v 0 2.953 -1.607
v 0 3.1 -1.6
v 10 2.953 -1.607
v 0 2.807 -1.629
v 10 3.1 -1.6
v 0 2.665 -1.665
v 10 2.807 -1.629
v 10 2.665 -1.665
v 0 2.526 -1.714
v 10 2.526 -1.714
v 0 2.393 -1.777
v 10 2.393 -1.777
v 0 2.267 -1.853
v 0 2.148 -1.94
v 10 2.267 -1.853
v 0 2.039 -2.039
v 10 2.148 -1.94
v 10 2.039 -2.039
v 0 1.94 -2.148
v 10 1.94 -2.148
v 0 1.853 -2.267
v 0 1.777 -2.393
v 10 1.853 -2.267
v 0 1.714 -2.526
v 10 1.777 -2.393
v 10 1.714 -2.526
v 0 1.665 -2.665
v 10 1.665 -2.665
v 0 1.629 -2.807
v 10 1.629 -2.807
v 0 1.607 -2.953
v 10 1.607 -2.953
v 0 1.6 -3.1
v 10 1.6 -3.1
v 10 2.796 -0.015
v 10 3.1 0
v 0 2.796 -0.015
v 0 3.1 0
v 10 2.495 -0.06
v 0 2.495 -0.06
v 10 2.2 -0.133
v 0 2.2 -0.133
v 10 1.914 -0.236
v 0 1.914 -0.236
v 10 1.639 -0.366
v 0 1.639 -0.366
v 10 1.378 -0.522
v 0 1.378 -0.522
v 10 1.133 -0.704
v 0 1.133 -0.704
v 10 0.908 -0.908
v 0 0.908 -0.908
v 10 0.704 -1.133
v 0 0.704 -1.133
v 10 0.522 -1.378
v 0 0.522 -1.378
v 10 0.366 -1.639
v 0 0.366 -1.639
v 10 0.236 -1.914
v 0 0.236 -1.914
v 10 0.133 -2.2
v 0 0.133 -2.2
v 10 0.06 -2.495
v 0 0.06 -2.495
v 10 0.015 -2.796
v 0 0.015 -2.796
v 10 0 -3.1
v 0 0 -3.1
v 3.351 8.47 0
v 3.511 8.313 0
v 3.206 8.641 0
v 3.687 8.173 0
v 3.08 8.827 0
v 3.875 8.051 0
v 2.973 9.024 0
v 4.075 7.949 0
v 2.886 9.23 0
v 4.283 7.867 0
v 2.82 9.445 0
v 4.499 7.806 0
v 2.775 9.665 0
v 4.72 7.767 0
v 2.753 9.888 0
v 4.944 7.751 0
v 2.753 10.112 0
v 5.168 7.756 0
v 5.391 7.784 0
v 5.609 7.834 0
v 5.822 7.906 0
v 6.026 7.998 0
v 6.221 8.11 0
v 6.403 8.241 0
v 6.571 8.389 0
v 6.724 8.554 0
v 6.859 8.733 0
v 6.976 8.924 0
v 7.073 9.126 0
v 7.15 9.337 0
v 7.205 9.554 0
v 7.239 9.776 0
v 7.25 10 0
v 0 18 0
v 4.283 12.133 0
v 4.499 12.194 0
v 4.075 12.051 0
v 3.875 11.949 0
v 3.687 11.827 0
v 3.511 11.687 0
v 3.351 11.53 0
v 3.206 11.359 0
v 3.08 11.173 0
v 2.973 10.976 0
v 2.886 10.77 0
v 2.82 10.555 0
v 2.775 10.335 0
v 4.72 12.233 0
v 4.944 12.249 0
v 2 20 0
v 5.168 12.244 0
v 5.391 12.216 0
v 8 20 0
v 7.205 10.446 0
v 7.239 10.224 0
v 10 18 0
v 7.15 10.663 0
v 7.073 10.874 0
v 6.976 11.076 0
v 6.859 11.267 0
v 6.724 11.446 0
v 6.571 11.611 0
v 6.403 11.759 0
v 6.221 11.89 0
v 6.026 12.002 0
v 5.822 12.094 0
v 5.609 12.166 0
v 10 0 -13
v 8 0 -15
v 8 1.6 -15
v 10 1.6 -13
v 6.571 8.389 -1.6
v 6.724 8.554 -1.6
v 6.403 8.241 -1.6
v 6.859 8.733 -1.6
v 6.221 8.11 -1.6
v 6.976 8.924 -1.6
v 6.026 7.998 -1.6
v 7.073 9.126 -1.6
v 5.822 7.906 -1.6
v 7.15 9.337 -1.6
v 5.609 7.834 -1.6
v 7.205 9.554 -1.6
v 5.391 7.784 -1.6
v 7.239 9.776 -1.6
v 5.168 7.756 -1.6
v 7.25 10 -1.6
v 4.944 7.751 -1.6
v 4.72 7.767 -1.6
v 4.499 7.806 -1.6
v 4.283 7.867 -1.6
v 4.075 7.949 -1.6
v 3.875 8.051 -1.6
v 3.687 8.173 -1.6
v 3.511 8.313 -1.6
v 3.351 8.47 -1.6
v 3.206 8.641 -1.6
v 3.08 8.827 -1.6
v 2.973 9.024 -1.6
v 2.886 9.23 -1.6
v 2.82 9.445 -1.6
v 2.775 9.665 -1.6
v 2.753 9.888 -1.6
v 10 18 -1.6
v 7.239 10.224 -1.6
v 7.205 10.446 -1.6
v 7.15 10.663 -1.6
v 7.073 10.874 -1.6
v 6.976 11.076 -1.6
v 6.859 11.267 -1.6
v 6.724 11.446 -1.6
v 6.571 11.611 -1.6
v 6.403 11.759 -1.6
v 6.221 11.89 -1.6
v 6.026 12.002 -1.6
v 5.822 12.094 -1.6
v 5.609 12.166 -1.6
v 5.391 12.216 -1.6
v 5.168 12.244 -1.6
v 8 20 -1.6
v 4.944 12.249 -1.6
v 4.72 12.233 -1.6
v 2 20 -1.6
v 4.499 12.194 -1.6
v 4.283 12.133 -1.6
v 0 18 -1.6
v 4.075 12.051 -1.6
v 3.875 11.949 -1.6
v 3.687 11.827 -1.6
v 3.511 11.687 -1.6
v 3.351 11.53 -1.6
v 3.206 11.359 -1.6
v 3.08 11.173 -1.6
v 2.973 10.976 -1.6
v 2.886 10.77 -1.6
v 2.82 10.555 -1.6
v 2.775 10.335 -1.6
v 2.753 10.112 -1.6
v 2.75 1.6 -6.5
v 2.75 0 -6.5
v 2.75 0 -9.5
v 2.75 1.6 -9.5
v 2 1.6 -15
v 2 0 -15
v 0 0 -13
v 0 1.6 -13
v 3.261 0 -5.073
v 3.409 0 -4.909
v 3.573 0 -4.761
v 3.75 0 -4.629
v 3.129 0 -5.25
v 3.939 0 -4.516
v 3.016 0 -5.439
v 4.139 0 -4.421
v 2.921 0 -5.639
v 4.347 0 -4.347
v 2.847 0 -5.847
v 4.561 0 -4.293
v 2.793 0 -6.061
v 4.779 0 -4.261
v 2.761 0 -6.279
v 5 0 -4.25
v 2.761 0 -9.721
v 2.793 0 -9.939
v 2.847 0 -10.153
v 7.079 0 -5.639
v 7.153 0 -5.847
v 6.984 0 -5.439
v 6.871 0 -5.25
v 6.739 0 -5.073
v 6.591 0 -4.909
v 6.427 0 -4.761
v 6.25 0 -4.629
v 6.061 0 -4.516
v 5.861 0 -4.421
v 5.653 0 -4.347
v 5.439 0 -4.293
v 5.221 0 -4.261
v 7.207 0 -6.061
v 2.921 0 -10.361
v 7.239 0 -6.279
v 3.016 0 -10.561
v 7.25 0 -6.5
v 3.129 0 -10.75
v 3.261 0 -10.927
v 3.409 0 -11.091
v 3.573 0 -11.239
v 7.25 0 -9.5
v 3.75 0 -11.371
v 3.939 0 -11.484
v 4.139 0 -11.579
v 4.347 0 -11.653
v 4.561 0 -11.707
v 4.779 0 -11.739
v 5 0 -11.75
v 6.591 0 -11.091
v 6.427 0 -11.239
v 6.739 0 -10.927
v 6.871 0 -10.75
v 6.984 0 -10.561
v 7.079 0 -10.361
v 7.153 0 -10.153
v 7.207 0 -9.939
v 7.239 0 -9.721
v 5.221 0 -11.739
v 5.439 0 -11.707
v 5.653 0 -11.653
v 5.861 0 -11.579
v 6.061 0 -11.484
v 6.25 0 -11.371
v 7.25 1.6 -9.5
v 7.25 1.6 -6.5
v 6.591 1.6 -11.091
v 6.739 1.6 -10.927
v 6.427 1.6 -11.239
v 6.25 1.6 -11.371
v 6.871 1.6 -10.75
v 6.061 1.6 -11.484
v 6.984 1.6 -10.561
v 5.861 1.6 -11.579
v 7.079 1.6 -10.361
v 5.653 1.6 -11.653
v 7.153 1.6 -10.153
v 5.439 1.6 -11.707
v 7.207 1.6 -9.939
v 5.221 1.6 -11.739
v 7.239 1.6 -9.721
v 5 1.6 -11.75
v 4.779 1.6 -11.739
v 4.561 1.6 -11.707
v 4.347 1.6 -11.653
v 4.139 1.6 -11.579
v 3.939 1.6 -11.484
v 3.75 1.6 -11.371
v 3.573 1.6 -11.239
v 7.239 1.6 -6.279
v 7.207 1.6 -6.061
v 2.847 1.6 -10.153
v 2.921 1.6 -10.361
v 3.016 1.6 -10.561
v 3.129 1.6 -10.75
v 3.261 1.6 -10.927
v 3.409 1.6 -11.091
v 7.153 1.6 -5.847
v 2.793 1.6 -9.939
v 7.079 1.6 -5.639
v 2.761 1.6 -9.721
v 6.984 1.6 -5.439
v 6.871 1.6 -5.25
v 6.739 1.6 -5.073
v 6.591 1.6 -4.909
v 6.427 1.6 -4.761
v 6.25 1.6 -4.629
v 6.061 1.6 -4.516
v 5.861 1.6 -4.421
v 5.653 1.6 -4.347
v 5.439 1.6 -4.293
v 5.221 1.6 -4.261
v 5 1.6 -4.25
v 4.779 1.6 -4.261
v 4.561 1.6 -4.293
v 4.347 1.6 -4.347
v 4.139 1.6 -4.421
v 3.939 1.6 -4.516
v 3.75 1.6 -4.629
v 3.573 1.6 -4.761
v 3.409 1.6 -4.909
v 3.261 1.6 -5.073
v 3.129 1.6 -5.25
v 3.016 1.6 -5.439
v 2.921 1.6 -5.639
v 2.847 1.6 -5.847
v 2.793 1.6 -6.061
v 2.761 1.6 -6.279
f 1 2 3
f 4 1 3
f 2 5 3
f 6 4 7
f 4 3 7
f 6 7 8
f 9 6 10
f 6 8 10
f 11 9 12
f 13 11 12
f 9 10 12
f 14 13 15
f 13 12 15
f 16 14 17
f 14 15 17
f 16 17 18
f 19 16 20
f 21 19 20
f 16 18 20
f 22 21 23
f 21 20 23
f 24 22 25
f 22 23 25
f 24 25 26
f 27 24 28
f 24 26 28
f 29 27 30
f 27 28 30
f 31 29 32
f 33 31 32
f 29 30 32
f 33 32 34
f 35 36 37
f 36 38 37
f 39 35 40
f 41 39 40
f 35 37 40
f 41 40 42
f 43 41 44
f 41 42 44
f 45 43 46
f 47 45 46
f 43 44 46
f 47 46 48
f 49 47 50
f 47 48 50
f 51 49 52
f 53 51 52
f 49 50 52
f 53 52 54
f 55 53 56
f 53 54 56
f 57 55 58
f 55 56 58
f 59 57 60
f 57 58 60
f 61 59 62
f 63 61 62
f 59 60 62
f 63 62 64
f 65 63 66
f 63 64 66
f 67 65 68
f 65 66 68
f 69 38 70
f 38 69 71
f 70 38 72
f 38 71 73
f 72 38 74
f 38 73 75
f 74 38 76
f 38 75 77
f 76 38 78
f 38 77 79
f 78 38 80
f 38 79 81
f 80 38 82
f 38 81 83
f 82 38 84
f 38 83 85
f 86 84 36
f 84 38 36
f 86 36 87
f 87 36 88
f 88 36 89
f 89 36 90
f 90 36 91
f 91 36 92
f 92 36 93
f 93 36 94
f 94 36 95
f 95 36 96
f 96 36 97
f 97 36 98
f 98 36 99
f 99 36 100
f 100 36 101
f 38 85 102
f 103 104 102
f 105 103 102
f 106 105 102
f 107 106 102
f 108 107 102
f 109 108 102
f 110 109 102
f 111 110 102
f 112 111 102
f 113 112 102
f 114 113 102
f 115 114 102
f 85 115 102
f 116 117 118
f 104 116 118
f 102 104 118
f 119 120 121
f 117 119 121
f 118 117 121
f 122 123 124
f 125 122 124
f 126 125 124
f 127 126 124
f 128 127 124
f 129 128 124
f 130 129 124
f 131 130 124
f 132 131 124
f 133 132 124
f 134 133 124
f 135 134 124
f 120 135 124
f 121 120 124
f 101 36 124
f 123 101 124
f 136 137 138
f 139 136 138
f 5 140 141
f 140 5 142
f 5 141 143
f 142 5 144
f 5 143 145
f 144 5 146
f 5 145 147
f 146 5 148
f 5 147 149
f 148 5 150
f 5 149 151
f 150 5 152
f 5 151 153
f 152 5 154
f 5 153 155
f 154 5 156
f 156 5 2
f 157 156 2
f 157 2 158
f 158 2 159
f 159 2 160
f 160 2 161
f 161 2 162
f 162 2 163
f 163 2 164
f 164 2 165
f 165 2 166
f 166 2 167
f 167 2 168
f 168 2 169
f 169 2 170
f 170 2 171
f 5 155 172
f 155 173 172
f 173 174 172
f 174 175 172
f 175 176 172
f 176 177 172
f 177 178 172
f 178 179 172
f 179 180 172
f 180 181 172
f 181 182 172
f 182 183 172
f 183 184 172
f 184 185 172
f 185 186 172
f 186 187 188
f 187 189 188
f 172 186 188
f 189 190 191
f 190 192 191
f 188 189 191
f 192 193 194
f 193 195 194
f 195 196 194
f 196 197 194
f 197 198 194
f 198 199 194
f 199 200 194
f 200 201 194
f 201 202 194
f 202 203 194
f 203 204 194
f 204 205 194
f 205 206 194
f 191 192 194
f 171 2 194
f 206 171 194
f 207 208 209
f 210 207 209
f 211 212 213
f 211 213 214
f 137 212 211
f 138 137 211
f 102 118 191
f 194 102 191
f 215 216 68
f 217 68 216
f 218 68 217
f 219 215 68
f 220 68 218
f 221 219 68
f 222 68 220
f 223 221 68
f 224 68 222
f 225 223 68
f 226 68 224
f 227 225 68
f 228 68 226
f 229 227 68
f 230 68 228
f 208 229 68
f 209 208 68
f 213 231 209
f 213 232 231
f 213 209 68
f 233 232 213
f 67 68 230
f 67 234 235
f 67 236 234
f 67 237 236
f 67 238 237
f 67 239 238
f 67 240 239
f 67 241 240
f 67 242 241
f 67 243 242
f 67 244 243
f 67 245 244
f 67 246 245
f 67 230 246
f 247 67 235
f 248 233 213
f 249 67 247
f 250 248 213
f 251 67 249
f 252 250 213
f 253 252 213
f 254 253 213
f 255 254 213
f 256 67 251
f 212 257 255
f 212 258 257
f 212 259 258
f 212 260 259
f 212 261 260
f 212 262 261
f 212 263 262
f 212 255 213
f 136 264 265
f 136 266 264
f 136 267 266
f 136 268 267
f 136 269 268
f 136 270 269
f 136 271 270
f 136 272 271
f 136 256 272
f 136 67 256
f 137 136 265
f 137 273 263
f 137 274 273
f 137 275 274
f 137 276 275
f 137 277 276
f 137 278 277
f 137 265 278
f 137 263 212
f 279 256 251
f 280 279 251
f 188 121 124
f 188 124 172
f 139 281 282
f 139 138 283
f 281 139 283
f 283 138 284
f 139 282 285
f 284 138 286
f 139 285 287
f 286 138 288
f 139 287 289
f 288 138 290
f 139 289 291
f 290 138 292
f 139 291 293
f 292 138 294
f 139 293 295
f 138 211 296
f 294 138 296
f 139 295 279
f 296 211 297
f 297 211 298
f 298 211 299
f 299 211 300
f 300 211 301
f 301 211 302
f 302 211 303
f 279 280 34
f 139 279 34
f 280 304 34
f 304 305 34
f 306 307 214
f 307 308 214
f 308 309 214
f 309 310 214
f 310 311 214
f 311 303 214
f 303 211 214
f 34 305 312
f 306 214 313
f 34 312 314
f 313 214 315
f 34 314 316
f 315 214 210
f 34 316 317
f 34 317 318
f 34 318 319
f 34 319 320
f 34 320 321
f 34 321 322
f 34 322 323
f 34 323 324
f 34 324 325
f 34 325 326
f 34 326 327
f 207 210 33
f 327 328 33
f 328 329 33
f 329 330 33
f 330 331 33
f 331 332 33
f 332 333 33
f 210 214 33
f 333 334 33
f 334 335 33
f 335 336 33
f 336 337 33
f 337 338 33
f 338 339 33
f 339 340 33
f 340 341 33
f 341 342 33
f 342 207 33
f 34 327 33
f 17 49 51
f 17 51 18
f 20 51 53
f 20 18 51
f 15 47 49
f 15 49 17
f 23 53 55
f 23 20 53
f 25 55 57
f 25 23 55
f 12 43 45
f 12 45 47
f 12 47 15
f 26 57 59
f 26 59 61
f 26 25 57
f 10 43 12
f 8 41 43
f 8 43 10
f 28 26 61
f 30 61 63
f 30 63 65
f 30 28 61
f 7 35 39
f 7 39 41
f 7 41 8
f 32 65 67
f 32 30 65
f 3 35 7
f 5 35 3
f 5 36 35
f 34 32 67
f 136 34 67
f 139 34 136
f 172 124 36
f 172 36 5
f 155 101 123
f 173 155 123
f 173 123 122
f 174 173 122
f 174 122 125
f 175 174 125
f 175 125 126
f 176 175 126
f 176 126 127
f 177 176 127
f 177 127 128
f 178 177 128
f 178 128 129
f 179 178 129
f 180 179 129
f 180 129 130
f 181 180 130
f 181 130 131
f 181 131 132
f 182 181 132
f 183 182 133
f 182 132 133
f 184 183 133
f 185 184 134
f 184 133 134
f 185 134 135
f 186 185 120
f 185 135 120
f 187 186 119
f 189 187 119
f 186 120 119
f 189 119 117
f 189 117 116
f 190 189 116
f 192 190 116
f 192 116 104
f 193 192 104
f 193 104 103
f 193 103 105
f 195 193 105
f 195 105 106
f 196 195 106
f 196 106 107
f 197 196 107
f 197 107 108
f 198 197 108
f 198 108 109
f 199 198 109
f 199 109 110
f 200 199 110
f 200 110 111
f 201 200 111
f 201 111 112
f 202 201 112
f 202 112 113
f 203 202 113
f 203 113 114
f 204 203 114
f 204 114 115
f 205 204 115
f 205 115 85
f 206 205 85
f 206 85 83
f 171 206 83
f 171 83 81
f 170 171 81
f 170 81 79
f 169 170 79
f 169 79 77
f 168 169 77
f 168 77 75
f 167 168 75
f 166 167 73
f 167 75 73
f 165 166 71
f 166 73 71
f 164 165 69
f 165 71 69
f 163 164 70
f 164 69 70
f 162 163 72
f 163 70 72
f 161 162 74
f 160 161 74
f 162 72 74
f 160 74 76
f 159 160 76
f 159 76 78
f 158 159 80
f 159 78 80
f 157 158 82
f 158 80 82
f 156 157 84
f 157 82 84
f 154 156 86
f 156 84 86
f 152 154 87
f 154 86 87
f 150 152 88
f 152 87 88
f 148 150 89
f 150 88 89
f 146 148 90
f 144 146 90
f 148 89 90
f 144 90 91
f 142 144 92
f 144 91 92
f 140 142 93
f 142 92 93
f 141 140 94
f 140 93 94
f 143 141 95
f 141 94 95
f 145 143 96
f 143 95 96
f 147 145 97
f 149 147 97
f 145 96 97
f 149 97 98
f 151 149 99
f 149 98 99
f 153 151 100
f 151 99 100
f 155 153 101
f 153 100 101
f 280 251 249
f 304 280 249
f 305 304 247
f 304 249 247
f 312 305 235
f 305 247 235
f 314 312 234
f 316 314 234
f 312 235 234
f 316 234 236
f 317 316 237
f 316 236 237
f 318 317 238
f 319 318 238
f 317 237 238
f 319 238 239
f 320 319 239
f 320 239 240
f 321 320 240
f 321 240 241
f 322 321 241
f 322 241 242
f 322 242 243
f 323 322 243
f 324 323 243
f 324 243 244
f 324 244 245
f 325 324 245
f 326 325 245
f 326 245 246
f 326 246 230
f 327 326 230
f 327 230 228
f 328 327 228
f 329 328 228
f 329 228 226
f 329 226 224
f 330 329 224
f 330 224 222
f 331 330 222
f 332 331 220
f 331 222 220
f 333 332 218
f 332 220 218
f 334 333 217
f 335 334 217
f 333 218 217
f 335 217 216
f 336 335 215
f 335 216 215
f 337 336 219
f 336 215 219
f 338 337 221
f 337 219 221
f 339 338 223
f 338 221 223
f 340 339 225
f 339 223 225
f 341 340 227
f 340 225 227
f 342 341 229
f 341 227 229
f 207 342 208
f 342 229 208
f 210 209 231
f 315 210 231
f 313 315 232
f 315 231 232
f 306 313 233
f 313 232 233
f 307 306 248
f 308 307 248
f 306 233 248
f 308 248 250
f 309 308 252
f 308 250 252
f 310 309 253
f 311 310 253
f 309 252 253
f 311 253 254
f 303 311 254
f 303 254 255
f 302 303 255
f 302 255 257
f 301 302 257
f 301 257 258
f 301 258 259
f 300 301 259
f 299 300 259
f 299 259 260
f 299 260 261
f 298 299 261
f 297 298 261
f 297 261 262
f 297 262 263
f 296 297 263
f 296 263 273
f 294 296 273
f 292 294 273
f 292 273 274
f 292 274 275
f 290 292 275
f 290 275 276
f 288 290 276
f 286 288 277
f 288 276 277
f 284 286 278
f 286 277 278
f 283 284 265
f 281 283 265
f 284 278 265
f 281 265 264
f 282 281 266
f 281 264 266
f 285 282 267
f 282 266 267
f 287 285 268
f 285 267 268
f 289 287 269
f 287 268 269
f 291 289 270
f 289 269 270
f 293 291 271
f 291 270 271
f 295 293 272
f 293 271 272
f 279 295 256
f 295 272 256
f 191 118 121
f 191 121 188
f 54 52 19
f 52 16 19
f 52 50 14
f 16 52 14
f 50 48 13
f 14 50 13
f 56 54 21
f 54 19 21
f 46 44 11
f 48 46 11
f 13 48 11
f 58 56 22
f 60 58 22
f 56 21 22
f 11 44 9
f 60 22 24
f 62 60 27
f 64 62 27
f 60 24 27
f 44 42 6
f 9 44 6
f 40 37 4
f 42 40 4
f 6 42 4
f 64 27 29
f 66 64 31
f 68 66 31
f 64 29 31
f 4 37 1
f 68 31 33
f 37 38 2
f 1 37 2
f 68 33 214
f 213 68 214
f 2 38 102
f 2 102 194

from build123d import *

# Parameters (mm, degrees)
SKETCH1_W                  = 15
SKETCH1_H                  = 20
BOSS_EXTRUDE1_DEPTH        = 10
SKETCH2_W                  = 13.4
SKETCH2_H                  = 18.4
CUT_EXTRUDE1_DEPTH         = 27.925824036
CUT_EXTRUDE2_DEPTH         = 27.925824036
F_4_5_4_5_DIAMETER_HOLE1_D = 4.5
CHAMFER1_SIZE              = 2
FILLET1_R                  = 1.5
FILLET2_R                  = 3.1


with BuildPart() as part:
    # Sketch1 → Boss-Extrude1 (new body)
    with BuildSketch(Plane(origin=(10, 0, 0), x_dir=(0, 0, -1), z_dir=(1, 0, 0))):
        with Locations((7.5, 10)):
            Rectangle(SKETCH1_W, SKETCH1_H)
    extrude(amount=-BOSS_EXTRUDE1_DEPTH)

    # Sketch2 → Cut-Extrude1 (cut, through all)
    with BuildSketch(Plane.ZY):
        with Locations((-8.3, 10.8)):
            Rectangle(SKETCH2_W, SKETCH2_H)
    extrude(amount=-CUT_EXTRUDE1_DEPTH, mode=Mode.SUBTRACT)

    # Sketch3 → Cut-Extrude2 (cut, through all)
    with BuildSketch(Plane.XZ):
        with BuildLine():
            Line((7.25, -9.5), (7.25, -6.5))
            ThreePointArc((7.25, -6.5), (5, -4.25), (2.75, -6.5))
            Line((2.75, -6.5), (2.75, -9.5))
            ThreePointArc((2.75, -9.5), (5, -11.75), (7.25, -9.5))
        make_face()
    extrude(amount=-CUT_EXTRUDE2_DEPTH, mode=Mode.SUBTRACT)

    # Ø4.5 (4.5) Diameter Hole1 (through all)
    with Locations(Plane(origin=(0, 0, -1.6), x_dir=(-1, 0, 0), z_dir=(0, 0, -1))):
        with Locations((-5, 10)):
            Hole(F_4_5_4_5_DIAMETER_HOLE1_D / 2)

    # Chamfer1
    chamfer1_edges = [part.edges().sort_by_distance(p)[0] for p in [
        (0, 0.8, -15),
        (10, 20, -0.8),
        (0, 20, -0.8),
        (10, 0.8, -15),
    ]]
    chamfer(chamfer1_edges, length=CHAMFER1_SIZE)

    # Fillet1
    fillet1_edges = [part.edges().sort_by_distance(p)[0] for p in [
        (5, 1.6, -1.6),
    ]]
    fillet(fillet1_edges, radius=FILLET1_R)

    # Fillet2
    fillet2_edges = [part.edges().sort_by_distance(p)[0] for p in [
        (5, 0, 0),
    ]]
    fillet(fillet2_edges, radius=FILLET2_R)


solid = part.part
